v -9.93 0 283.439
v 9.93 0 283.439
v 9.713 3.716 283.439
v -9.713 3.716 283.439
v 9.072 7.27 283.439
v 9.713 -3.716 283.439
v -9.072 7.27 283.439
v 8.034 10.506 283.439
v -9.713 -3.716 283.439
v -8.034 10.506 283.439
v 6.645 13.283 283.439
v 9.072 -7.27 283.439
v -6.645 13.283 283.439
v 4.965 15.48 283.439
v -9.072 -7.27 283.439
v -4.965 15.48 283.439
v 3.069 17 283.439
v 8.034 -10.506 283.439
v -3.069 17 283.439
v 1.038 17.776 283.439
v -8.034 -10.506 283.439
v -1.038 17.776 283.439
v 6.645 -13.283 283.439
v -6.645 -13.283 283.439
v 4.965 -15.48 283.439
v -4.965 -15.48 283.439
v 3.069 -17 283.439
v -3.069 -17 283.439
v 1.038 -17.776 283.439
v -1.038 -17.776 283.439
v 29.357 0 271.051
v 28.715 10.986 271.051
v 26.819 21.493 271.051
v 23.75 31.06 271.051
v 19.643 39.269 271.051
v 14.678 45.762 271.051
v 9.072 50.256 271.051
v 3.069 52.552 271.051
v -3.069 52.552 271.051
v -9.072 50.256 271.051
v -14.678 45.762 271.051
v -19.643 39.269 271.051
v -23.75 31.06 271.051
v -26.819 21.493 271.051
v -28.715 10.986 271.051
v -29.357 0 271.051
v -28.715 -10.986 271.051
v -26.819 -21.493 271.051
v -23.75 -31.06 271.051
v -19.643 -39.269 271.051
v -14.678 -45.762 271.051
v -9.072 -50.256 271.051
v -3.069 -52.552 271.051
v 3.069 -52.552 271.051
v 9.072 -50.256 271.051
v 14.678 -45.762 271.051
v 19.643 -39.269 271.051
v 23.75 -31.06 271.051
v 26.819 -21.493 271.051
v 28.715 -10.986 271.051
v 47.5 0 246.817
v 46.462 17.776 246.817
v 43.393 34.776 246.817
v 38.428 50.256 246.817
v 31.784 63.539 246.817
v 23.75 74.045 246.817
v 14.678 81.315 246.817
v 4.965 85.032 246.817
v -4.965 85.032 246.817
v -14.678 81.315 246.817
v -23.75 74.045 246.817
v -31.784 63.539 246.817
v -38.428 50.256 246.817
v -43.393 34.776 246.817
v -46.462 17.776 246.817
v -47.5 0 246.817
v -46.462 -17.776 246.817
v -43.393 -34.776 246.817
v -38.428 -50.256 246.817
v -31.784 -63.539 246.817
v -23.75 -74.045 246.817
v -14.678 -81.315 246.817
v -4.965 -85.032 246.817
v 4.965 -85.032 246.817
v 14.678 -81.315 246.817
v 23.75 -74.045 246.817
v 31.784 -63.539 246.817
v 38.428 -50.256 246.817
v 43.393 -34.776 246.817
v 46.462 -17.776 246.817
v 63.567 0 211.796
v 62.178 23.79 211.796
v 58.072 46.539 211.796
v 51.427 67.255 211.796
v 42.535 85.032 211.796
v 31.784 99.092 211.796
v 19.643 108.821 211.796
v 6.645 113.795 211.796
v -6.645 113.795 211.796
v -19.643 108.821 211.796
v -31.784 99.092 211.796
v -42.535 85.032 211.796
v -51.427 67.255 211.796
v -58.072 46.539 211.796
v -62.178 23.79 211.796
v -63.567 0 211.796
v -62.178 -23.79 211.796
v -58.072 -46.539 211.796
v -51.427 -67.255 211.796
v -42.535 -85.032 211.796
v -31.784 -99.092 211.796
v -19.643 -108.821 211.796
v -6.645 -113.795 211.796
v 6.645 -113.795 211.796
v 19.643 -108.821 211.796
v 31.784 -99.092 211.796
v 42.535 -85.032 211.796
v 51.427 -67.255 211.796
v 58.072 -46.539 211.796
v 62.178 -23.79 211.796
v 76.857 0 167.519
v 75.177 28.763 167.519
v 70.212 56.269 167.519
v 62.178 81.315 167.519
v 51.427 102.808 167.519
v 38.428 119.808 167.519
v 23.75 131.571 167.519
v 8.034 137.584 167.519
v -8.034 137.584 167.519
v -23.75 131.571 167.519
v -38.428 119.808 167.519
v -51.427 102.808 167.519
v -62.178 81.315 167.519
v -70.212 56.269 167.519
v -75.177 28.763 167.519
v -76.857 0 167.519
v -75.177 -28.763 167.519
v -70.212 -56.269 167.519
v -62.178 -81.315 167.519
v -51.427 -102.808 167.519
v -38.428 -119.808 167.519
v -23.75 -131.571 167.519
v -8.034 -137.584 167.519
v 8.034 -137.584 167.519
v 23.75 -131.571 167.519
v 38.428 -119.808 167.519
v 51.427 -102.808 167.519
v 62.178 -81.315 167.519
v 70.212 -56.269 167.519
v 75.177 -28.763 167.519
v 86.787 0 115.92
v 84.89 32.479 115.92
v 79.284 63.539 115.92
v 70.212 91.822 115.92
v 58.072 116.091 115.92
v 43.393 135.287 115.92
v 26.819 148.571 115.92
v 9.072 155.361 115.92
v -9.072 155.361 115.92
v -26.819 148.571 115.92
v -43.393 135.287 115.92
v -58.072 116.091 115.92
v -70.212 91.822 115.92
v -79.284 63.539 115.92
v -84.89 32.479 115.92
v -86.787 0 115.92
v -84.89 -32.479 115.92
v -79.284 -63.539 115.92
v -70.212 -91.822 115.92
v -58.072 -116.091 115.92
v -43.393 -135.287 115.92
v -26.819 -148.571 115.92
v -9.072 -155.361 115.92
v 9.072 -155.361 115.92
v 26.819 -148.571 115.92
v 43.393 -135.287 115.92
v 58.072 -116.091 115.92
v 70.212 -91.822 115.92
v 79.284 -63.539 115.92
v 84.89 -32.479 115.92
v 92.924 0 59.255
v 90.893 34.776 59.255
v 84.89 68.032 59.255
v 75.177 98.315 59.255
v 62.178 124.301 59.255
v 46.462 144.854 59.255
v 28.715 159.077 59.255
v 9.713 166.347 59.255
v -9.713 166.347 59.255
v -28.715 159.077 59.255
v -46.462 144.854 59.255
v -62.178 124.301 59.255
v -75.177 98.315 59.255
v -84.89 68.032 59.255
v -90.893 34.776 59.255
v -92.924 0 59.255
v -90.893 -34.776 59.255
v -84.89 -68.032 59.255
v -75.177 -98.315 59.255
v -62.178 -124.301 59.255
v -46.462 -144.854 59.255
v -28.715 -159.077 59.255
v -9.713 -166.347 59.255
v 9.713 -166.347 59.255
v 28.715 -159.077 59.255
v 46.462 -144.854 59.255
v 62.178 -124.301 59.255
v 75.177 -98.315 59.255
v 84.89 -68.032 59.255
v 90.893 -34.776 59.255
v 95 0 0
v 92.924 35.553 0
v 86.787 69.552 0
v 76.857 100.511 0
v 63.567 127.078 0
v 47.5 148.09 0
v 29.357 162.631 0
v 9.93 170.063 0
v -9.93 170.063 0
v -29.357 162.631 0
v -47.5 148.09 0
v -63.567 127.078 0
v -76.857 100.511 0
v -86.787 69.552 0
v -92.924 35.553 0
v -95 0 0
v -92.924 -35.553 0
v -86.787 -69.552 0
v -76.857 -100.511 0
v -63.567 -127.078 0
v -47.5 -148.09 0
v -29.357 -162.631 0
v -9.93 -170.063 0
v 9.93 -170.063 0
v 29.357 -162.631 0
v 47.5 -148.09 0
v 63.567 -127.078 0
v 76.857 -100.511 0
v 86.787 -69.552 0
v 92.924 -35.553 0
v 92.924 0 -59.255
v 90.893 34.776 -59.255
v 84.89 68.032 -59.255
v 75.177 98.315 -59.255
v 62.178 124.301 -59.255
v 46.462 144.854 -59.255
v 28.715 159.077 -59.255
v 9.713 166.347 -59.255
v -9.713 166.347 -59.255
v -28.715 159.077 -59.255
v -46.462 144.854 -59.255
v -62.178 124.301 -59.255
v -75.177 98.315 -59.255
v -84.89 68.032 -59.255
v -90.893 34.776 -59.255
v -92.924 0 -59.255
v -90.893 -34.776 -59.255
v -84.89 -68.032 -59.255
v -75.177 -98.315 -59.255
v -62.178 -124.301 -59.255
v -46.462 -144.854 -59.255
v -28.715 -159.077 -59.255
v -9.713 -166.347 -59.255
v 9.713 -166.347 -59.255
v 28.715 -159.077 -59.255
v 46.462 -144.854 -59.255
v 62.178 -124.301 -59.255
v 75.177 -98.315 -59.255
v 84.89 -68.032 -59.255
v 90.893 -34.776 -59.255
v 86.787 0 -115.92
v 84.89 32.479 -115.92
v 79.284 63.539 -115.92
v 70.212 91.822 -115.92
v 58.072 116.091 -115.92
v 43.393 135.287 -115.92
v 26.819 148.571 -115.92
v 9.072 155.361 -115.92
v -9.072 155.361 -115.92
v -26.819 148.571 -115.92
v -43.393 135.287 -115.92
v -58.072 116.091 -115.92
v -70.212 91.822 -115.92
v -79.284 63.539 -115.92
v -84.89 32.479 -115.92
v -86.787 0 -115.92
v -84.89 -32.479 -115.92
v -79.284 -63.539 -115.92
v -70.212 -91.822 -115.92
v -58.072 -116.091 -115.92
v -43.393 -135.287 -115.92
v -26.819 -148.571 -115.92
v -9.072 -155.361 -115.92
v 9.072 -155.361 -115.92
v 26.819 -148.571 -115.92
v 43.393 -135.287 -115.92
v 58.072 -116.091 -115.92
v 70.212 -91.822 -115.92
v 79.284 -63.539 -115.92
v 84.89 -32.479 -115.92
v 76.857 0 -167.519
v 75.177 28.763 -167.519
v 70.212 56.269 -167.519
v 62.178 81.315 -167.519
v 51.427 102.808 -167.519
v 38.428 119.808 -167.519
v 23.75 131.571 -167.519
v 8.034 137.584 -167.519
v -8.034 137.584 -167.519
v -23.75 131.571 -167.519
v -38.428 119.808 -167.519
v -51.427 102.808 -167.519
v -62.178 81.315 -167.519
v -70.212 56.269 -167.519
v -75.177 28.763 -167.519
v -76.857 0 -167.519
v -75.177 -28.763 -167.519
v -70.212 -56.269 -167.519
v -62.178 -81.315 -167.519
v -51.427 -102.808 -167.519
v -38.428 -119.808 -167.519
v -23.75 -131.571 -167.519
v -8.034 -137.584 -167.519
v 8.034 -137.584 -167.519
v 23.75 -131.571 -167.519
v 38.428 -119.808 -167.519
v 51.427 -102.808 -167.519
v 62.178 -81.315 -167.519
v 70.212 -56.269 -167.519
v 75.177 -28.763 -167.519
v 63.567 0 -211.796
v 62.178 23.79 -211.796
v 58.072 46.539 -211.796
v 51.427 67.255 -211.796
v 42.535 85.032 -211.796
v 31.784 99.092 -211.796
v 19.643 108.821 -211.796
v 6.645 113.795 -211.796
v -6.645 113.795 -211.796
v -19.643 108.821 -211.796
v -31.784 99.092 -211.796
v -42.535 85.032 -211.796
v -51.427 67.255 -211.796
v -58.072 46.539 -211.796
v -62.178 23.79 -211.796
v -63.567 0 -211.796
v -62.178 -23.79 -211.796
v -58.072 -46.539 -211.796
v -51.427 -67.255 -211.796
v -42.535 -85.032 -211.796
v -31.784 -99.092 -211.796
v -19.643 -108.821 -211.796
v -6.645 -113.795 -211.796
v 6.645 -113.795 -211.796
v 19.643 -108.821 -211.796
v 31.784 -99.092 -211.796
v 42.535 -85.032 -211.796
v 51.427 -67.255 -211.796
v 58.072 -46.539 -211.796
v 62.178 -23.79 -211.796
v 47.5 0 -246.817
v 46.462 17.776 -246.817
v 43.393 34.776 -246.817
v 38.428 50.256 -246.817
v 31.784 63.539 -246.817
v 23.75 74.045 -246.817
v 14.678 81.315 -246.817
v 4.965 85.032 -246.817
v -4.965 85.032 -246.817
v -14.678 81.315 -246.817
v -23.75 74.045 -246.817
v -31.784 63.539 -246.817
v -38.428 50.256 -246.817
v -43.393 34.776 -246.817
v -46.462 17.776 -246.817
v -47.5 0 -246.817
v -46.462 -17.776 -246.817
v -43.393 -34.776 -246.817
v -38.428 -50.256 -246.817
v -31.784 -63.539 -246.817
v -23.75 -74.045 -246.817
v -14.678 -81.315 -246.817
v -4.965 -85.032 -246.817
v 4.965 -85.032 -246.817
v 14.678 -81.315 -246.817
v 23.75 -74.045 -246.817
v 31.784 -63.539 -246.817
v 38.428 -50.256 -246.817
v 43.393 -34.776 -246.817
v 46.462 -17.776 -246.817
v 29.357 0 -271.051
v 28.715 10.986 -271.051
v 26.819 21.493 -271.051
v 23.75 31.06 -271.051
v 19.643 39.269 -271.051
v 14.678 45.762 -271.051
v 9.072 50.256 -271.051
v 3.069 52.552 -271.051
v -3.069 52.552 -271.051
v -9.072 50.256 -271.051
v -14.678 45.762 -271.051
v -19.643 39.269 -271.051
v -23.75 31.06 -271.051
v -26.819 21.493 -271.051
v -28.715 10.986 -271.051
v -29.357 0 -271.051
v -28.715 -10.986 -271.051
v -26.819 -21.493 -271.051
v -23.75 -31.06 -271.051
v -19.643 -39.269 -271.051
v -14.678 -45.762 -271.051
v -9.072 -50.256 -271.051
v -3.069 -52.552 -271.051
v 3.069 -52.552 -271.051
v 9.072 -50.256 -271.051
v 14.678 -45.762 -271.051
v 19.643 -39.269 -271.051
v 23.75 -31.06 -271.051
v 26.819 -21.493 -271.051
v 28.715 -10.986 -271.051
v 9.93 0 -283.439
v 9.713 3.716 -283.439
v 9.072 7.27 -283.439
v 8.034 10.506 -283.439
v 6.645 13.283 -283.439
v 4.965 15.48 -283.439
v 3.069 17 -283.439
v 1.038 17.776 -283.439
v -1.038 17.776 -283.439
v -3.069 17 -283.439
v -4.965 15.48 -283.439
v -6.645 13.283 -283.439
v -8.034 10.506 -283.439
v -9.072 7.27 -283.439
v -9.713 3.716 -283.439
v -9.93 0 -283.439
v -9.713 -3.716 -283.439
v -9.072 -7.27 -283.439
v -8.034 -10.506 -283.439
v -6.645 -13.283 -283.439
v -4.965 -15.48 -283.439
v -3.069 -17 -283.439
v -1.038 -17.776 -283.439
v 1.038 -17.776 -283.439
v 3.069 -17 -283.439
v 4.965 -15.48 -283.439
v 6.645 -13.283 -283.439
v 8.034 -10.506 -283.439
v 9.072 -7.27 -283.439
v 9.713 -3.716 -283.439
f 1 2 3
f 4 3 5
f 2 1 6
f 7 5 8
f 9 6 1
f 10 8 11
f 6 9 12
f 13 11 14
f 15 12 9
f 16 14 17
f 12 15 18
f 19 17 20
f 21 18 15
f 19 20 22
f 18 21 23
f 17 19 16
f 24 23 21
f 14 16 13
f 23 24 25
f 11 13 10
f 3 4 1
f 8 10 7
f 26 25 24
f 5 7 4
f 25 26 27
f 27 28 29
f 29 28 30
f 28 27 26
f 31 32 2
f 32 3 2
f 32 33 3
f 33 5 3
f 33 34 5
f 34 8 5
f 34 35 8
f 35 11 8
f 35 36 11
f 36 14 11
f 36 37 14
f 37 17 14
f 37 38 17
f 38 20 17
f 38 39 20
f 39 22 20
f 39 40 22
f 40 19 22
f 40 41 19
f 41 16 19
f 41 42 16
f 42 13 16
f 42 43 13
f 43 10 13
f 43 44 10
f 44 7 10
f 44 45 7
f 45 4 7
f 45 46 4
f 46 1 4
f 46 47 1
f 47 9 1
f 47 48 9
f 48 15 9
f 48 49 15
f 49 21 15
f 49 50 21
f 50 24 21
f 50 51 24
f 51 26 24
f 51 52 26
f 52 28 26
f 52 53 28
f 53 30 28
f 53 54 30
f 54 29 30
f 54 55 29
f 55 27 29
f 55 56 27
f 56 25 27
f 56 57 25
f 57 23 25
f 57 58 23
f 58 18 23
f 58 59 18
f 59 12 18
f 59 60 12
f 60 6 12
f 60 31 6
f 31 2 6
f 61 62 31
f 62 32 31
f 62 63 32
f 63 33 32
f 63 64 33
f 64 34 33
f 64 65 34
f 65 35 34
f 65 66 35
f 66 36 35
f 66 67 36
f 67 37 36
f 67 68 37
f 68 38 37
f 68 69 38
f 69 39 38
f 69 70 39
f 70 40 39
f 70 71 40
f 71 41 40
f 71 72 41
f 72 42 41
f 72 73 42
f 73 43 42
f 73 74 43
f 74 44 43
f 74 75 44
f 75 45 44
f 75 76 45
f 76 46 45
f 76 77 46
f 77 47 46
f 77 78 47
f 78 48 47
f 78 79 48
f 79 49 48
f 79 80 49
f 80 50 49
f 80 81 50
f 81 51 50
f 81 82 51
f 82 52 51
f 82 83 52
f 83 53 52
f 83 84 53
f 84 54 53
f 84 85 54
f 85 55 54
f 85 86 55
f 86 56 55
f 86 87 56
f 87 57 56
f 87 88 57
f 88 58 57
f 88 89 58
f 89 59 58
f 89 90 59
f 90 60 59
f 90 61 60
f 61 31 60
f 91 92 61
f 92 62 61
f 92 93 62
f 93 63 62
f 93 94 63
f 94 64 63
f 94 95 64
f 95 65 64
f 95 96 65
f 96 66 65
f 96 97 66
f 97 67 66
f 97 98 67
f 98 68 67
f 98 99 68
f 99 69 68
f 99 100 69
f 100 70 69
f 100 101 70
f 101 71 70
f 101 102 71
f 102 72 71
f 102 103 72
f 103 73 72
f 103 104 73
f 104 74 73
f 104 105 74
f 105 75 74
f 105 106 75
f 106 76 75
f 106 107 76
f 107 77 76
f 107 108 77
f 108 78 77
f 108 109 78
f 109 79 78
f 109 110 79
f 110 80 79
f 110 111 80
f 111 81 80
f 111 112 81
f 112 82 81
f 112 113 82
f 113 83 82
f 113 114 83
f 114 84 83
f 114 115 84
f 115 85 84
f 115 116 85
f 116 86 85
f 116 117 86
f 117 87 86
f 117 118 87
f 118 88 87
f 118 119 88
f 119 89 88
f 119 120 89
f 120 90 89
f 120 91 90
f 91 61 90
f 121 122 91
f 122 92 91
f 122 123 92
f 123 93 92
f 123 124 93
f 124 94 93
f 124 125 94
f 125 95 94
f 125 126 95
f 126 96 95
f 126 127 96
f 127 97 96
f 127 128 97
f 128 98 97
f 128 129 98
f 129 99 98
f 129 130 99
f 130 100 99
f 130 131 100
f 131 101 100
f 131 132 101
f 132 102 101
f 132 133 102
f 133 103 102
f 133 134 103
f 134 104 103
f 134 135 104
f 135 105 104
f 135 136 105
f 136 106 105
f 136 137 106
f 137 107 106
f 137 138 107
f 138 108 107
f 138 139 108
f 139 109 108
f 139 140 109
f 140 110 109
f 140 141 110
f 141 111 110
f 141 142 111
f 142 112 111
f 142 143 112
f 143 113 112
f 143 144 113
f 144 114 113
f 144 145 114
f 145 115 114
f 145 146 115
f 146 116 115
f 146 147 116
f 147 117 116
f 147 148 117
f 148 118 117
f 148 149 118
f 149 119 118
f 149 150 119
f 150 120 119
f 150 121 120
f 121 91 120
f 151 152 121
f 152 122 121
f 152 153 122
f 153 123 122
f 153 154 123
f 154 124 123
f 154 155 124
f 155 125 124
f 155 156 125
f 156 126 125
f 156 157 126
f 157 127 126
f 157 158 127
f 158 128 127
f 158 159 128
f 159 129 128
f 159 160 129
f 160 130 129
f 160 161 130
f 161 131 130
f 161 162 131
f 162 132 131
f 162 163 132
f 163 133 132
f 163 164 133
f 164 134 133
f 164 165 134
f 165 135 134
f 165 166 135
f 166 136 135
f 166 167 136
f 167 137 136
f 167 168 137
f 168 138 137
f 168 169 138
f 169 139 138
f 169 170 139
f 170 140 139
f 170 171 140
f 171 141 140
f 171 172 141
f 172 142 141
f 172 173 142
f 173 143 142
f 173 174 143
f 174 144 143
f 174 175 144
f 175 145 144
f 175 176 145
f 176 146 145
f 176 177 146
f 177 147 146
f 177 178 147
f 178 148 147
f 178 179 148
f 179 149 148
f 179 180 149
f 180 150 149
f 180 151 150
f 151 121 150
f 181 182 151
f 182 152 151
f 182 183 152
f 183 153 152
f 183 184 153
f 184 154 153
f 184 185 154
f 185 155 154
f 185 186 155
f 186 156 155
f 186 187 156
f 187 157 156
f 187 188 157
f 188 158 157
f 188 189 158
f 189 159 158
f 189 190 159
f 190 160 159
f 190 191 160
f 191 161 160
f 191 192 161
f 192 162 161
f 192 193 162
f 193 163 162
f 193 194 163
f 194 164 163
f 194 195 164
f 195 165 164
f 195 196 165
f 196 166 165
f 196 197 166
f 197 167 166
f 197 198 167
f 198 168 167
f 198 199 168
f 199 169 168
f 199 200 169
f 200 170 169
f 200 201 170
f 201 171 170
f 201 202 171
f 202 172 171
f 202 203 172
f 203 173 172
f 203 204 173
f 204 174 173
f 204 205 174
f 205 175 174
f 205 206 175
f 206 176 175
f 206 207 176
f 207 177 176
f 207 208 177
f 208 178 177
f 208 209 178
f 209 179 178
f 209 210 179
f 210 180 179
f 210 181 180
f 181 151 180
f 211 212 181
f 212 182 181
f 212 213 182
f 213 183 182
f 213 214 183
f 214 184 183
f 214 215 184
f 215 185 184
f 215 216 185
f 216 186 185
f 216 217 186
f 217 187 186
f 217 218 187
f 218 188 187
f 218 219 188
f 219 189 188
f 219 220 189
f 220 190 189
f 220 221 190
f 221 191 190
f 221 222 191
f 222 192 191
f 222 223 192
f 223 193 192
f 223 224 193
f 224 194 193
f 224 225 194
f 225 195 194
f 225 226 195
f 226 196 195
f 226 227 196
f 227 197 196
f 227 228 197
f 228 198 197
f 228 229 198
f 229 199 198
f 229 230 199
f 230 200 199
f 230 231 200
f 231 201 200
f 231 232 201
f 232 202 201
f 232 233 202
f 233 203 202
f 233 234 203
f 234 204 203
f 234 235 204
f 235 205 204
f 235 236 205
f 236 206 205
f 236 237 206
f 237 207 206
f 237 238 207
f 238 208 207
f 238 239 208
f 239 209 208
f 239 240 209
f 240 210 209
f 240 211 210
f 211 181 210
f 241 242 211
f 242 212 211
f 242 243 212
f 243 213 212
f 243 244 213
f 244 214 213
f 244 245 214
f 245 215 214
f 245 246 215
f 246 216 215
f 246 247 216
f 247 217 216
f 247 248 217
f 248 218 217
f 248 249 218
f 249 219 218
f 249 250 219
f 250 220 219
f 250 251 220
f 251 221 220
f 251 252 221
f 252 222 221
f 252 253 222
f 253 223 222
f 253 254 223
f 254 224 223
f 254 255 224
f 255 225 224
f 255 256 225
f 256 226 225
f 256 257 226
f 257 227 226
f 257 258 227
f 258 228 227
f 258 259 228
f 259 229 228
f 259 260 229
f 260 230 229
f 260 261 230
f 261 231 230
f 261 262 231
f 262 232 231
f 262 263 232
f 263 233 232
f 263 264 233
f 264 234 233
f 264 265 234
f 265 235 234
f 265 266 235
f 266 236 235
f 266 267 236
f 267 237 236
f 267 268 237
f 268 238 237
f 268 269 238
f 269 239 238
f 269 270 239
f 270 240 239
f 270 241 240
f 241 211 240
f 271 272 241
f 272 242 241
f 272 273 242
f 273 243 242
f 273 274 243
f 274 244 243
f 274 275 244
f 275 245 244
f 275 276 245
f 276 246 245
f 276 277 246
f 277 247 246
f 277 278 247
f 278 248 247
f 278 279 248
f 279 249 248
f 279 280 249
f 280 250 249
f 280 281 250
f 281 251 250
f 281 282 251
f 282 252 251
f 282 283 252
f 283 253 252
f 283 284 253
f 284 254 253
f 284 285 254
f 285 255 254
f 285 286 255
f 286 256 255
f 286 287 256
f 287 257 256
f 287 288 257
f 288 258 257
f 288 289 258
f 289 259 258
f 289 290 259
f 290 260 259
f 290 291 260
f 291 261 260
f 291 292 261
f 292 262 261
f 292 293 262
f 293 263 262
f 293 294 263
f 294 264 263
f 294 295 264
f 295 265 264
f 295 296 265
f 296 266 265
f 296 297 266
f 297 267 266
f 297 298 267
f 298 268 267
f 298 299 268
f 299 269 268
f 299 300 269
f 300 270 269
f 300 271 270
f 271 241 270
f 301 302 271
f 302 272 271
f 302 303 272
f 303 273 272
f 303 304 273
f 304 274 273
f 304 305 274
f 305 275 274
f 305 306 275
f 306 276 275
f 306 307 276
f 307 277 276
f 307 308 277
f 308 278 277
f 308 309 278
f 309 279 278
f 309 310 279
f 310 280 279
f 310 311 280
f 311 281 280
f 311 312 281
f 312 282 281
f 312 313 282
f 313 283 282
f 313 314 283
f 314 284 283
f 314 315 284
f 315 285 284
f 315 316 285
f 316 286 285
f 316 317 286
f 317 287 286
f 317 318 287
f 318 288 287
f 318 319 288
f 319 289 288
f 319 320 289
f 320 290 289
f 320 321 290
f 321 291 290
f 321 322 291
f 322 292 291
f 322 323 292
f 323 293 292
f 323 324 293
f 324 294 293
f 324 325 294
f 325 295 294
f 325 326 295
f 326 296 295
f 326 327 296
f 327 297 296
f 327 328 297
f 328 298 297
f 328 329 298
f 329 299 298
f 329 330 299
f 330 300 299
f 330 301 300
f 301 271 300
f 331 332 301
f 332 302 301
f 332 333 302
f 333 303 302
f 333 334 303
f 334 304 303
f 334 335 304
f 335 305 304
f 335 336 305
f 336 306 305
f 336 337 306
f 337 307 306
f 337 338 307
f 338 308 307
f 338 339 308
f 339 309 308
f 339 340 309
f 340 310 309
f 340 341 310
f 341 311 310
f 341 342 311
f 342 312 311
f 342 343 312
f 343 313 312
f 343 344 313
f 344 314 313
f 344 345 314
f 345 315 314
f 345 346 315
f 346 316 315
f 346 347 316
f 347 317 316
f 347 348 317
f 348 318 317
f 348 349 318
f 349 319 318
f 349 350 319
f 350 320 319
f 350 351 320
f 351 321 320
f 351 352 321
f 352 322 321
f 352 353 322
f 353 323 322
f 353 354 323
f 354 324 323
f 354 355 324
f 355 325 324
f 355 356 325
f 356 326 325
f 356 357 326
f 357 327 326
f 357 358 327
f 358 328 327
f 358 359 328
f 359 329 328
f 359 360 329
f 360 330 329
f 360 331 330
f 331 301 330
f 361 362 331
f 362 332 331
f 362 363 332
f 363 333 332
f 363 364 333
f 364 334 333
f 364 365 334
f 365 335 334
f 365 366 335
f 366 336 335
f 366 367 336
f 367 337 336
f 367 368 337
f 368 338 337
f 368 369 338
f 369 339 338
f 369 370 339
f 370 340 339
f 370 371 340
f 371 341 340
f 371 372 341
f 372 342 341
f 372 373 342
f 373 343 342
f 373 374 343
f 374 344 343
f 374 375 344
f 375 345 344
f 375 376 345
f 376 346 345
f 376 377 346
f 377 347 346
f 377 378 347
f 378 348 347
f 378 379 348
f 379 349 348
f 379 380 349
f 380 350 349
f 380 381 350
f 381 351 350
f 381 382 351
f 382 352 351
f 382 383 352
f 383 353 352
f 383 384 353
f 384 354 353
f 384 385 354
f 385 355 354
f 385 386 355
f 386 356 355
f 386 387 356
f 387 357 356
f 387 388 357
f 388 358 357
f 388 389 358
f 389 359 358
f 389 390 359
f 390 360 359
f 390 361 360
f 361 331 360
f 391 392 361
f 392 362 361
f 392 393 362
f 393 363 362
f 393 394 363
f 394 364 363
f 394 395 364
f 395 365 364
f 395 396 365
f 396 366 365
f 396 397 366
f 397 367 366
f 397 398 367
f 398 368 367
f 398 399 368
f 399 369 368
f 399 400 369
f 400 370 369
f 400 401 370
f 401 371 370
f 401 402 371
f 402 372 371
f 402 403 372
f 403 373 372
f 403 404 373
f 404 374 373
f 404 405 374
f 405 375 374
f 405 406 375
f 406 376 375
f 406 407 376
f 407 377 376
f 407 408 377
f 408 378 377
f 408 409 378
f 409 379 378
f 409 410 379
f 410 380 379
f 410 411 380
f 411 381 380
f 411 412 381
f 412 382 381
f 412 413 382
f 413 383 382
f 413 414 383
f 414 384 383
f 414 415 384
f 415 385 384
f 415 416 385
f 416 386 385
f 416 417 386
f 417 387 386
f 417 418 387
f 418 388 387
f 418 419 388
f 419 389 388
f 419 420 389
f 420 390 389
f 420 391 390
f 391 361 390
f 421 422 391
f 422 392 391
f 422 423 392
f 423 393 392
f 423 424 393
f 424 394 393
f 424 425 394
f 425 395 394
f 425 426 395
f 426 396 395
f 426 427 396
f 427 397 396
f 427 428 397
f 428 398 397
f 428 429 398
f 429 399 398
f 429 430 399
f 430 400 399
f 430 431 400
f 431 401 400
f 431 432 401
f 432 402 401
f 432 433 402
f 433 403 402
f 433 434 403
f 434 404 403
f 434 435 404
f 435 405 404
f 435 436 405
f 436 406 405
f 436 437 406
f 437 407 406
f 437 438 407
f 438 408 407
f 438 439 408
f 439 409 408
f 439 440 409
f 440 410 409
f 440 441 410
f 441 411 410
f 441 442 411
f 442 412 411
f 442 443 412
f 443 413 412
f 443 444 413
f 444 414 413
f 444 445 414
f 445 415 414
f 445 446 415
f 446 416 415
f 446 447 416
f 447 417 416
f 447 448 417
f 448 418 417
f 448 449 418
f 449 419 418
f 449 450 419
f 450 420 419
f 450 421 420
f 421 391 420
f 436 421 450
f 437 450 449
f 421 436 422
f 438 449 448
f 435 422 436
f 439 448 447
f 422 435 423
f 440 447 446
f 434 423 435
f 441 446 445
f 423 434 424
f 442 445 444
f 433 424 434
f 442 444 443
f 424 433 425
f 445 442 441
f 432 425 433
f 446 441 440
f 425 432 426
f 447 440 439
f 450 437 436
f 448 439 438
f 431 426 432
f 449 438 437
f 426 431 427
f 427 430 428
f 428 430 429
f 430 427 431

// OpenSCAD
// Generated by SolidPython 1.0.1 on 2020-07-29 00:46:46


scale(v = [5, 9, 15]) {
	sphere(r = 19);
}
/***********************************************
*********      SolidPython code:      **********
************************************************
 
# import packages: SolidPython
from solid import *
from solid.utils import *
from itertools import chain, combinations, permutations


class Resize:

    def __init__(self, scad_file):
        self.scad_file = scad_file
        #self.scad_file = import_scad(scad_file)
        # cone/cylinder param:
        self.r1 = 0
        self.r2 = 0
        self.h = 0
        # rectangular prism param:
        self.w = 0
        self.l = 0
        # ellipse param:
        self.r = 0

    # import OpenScad code (file name corresponds to shape)


    # classify shape + parameters
    def assign(self, param1, param2, param3):
        if self.scad_file == 'cone.scad':
            self.r1 = param1
            self.r2 = param2
            self.h = param3
        elif self.scad_file == 'cylinder.scad':
            self.r1 = param1
            self.r2 = param2
            self.h = param3
        elif self.scad_file == 'rectangularPrism.scad':
            self.h = param1
            self.l = param2
            self.w = param3
        else:
            self.r = param1
            self.h = param2

    # resize parameters
    def iterate(self):
        x = range(3, 20, 2)
        i = 1
        if self.scad_file == 'cone.scad':
            tempList = list(permutations(x, 2))
            for temp in tempList:
                param1 = temp[0]
                param2 = temp[1]
                filepath = 'produced_scad_files/' + 'cone' + str(param1) + '_' + str(param2) + '_' + '.scad'
                scad_render_to_file(cylinder(h=param1, r1=param2, r2=0), filepath)

        elif self.scad_file == 'cylinder.scad':
            tempList = list(permutations(x, 3))
            for temp in tempList:
                param1 = temp[0]
                param2 = temp[1]
                filepath = 'produced_scad_files/' + 'cylinder' + str(param1) + '_' + str(param2) + '_' + '.scad'
                scad_render_to_file(cylinder(h=param1, r1=param2, r2=param2), filepath)

        elif self.scad_file == 'rectangularPrism.scad':
            tempList = list(permutations(x, 3))
            for temp in tempList:
                param1 = temp[0]
                param2 = temp[1]
                param3 = temp[2]
                filepath = 'produced_scad_files/' + 'rectangularPrism' + str(param1) + '_' + str(param2) + '_' + str(
                    param3) + '.scad'
                scad_render_to_file(cube(size=(param1, param2, param3)), filepath)

        elif self.scad_file == 'ellipse.scad':
            tempList = list(permutations(x, 4))
            for temp in tempList:
                param1 = temp[0]
                param2 = temp[1]
                param3 = temp[2]
                param4 = temp[3]
                filepath = 'produced_scad_files/' + 'ellipse' + str(param1) + '_' + str(param2) + '_' + str(param3) + '_' + str(param4) + '.scad'
                scad_render_to_file(scale([param1, param2, param3])(sphere(r=param4)), filepath)

    def render_to_scadfile(self):
        scad_render_to_file(scad, 'example.scad') 
 
************************************************/
